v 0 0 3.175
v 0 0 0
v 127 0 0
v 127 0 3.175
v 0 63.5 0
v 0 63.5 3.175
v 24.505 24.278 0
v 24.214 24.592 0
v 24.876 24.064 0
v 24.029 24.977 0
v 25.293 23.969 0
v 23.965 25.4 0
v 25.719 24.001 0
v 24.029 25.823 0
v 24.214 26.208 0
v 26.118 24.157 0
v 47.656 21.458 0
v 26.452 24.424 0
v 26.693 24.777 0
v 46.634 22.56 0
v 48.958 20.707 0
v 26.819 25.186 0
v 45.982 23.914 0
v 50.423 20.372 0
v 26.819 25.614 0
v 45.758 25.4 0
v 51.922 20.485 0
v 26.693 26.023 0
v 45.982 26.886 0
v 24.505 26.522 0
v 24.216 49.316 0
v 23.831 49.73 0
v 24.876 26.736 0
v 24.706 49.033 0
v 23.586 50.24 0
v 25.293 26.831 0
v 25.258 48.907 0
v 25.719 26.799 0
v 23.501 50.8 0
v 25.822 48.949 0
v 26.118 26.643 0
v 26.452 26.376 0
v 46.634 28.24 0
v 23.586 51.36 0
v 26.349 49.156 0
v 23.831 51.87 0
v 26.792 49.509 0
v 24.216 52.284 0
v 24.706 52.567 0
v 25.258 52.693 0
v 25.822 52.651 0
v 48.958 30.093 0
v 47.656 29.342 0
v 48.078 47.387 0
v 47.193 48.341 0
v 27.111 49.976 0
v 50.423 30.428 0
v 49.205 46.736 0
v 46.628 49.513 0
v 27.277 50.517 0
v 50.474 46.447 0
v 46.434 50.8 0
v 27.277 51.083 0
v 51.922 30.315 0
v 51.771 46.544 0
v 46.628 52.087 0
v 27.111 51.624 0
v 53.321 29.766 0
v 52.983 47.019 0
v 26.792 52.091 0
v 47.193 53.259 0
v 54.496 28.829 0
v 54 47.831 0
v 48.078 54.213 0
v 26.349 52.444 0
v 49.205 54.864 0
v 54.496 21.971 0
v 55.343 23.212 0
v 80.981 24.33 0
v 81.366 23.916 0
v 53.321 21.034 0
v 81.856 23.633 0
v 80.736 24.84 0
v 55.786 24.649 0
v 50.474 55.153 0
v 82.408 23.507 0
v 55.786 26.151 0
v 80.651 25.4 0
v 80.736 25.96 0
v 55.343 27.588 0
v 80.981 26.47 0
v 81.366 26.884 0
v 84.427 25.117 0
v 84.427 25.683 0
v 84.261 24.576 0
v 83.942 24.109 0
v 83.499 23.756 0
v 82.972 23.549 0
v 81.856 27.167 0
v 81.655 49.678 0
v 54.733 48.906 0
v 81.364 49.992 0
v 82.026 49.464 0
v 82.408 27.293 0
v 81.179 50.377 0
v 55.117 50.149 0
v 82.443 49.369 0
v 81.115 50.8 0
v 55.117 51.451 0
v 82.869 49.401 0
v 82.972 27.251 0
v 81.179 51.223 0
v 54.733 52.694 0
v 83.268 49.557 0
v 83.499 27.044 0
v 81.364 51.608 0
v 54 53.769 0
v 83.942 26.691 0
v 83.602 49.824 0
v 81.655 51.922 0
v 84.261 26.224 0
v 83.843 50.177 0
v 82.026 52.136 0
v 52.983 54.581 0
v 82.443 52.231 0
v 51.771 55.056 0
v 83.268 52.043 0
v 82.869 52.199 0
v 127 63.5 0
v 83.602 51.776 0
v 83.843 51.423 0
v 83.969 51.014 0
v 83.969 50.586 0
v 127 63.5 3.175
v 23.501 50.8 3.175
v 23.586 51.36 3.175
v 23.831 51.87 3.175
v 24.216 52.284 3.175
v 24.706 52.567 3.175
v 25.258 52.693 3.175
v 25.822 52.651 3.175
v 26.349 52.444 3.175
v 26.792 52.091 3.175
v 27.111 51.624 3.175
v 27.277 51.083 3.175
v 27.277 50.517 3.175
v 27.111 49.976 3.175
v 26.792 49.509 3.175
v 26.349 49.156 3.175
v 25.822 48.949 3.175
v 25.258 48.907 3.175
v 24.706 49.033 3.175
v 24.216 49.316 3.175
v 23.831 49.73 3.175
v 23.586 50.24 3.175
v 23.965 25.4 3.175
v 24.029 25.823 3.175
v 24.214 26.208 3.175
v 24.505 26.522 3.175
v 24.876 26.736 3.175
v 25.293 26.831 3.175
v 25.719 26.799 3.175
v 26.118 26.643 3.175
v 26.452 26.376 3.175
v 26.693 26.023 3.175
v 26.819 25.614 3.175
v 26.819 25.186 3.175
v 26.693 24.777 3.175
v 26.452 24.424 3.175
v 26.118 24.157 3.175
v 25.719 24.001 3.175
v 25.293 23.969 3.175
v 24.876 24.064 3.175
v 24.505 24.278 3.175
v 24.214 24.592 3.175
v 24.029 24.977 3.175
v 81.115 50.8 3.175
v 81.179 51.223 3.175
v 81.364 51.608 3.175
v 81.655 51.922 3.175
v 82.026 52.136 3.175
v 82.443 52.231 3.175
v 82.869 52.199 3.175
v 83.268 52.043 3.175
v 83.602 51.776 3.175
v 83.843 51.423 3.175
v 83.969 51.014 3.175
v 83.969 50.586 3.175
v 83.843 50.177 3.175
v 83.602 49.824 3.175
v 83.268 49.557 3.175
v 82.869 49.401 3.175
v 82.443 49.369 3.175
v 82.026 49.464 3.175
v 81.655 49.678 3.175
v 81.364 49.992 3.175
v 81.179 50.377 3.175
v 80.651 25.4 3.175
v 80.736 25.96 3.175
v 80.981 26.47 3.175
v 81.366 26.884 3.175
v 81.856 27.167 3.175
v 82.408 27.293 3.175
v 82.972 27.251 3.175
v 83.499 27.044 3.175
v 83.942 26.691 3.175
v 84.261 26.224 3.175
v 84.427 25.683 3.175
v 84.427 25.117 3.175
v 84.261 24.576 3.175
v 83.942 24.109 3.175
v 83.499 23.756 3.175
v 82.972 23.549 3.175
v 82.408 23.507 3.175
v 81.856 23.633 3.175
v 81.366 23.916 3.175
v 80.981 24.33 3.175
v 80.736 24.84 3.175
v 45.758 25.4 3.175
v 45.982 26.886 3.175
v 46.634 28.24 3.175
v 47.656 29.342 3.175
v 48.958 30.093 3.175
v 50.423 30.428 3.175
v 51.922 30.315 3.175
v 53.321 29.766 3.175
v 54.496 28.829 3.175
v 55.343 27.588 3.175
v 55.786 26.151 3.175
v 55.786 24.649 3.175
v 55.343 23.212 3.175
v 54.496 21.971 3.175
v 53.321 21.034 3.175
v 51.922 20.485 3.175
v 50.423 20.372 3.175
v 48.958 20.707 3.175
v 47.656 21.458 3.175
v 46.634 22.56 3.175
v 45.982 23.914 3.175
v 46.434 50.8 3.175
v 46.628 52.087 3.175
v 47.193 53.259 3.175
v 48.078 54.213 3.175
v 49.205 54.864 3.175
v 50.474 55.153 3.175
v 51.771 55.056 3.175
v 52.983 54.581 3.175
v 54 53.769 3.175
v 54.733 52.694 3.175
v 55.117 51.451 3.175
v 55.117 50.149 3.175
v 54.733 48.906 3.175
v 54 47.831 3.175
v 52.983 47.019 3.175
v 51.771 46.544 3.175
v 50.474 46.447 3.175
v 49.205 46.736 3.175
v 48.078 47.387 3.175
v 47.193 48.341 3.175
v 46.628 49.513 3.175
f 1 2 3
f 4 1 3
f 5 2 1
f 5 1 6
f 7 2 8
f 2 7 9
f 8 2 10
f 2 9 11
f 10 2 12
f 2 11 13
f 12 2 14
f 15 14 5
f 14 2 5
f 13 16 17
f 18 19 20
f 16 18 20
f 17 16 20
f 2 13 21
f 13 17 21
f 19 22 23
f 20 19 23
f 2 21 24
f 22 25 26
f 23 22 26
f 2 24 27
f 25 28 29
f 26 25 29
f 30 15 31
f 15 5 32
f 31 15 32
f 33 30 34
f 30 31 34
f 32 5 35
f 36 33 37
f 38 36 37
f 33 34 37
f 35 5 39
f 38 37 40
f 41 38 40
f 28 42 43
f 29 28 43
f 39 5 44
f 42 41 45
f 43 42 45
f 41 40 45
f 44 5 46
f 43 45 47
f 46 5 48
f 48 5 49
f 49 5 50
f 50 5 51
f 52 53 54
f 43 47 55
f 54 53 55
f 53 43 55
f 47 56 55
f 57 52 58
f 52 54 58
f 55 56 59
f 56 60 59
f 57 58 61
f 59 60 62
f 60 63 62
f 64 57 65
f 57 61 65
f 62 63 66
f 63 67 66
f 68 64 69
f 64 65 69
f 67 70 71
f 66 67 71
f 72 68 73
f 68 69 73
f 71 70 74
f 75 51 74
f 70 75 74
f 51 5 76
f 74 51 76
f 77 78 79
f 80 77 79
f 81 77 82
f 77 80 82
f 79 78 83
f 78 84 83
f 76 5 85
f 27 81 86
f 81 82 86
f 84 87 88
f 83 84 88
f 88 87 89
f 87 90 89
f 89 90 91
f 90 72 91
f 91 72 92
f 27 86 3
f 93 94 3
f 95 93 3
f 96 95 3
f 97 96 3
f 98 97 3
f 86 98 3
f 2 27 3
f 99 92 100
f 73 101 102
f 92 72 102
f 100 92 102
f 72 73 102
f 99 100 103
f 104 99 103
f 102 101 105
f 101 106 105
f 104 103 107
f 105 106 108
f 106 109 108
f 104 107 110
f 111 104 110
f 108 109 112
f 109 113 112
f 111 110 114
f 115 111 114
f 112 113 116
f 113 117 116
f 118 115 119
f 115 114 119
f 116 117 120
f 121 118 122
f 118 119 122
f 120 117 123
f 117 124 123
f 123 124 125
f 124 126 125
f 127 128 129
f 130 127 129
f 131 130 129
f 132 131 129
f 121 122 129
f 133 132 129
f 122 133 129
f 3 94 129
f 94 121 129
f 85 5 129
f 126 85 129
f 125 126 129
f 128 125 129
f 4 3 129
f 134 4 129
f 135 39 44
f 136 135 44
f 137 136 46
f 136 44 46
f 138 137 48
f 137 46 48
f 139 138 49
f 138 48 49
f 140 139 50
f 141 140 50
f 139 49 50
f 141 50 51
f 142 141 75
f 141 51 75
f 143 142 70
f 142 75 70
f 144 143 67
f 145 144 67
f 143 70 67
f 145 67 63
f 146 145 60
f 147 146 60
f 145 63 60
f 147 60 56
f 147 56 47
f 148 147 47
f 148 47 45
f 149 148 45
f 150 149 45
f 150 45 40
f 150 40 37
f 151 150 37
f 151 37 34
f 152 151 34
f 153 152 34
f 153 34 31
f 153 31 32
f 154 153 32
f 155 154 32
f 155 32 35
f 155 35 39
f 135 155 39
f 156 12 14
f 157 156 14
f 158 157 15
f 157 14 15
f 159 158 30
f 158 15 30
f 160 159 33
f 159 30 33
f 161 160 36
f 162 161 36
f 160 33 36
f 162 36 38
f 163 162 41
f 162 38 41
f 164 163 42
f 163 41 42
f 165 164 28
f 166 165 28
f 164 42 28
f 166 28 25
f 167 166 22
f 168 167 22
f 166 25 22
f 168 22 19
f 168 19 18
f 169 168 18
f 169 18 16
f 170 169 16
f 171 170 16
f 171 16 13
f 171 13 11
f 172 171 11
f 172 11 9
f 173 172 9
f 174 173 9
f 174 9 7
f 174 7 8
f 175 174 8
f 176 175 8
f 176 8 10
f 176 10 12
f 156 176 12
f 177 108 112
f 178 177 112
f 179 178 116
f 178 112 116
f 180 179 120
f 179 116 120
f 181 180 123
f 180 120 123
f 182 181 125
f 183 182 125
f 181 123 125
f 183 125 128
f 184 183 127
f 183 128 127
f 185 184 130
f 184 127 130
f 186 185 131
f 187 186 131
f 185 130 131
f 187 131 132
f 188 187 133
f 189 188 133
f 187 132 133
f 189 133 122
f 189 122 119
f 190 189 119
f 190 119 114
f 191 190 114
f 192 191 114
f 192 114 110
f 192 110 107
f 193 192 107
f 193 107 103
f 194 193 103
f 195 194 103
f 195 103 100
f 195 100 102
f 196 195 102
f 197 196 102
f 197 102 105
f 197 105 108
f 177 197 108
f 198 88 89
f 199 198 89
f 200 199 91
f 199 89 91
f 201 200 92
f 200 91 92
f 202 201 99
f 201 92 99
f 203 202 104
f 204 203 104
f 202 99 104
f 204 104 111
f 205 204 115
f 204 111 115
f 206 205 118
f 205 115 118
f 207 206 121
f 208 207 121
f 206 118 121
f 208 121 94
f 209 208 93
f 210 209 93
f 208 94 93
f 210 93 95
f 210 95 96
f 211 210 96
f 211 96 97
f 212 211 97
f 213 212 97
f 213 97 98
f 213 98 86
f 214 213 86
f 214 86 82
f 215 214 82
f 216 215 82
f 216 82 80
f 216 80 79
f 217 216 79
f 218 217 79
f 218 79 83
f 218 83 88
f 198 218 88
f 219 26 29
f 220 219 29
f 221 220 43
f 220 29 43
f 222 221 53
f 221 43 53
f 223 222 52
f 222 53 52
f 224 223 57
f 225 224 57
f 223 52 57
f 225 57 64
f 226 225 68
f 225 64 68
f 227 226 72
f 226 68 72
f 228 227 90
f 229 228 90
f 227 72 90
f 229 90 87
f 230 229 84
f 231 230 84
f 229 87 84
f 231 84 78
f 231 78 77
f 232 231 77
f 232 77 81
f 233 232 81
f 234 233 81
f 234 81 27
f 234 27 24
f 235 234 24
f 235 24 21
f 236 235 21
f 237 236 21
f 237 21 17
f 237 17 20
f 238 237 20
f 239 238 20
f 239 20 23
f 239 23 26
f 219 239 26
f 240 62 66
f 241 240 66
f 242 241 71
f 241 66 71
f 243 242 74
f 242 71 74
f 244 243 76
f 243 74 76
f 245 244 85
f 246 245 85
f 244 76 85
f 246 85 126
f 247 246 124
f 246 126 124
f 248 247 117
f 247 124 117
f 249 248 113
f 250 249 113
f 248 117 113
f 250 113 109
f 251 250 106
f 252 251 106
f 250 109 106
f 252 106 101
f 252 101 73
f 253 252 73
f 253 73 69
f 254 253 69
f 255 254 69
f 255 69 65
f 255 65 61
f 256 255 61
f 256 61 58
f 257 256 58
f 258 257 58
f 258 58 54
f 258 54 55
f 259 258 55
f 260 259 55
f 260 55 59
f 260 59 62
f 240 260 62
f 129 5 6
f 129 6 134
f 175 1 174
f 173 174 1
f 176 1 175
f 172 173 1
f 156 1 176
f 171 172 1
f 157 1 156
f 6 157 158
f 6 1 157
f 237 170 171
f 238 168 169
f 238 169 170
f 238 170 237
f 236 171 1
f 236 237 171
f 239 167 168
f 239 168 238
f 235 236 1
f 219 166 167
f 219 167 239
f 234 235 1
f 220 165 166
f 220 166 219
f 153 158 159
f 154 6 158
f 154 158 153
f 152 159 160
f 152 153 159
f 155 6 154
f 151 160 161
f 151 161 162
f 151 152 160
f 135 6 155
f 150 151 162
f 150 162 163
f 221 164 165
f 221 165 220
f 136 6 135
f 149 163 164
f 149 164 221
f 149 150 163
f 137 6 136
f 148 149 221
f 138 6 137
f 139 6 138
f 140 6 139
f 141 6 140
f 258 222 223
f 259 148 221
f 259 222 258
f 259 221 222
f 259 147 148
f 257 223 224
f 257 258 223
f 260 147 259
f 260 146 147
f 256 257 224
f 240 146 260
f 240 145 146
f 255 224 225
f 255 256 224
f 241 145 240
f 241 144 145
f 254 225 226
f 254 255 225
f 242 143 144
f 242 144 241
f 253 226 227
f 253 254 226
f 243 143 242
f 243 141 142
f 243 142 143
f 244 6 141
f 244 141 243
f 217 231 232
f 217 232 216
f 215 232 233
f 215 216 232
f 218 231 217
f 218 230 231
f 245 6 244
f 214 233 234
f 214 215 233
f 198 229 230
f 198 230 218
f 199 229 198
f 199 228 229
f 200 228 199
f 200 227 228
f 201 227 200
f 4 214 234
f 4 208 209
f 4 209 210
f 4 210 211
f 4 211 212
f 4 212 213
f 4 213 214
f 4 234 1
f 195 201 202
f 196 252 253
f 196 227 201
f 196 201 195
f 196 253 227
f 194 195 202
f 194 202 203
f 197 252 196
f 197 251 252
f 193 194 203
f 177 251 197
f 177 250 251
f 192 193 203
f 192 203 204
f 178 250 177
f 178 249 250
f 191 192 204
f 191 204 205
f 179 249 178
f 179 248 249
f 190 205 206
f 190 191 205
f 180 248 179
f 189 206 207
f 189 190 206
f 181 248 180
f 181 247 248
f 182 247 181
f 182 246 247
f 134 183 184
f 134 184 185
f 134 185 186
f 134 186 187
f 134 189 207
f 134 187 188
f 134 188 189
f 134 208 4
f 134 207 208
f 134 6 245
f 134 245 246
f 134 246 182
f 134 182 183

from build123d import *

# Parameters (mm, degrees)
F0_W     = 127
F0_H     = 63.5
F1_DEPTH = 3.175
F3_D     = 3.7973
F4_D     = 2.8702
F5_D     = 8.73125
F6_D     = 10.0838


# Not quite as in the source:
# - a length typed as a fraction of an inch, garbled in the dataset ("3 / 203.2 mm" for 3/8 in), is restored


with BuildPart() as f1:
    # F0 (on Top) → F1 (new body)
    with BuildSketch(Plane.XY):
        with Locations((63.5, 31.75)):
            Rectangle(F0_W, F0_H)
    extrude(amount=F1_DEPTH)

    # F3 (through all)
    with Locations(Plane.XY.offset(3.175)):
        with Locations((25.4, 50.8), (82.55, 25.4)):
            Hole(F3_D / 2)

    # F4 (through all)
    with Locations(Plane.XY.offset(3.175)):
        with Locations((25.4, 25.4), (82.55, 50.8)):
            Hole(F4_D / 2)

    # F5 (through all)
    with Locations(Plane.XY.offset(3.175)):
        with Locations((50.8, 50.8)):
            Hole(F5_D / 2)

    # F6 (through all)
    with Locations(Plane.XY.offset(3.175)):
        with Locations((50.8, 25.4)):
            Hole(F6_D / 2)


solid = f1.part
